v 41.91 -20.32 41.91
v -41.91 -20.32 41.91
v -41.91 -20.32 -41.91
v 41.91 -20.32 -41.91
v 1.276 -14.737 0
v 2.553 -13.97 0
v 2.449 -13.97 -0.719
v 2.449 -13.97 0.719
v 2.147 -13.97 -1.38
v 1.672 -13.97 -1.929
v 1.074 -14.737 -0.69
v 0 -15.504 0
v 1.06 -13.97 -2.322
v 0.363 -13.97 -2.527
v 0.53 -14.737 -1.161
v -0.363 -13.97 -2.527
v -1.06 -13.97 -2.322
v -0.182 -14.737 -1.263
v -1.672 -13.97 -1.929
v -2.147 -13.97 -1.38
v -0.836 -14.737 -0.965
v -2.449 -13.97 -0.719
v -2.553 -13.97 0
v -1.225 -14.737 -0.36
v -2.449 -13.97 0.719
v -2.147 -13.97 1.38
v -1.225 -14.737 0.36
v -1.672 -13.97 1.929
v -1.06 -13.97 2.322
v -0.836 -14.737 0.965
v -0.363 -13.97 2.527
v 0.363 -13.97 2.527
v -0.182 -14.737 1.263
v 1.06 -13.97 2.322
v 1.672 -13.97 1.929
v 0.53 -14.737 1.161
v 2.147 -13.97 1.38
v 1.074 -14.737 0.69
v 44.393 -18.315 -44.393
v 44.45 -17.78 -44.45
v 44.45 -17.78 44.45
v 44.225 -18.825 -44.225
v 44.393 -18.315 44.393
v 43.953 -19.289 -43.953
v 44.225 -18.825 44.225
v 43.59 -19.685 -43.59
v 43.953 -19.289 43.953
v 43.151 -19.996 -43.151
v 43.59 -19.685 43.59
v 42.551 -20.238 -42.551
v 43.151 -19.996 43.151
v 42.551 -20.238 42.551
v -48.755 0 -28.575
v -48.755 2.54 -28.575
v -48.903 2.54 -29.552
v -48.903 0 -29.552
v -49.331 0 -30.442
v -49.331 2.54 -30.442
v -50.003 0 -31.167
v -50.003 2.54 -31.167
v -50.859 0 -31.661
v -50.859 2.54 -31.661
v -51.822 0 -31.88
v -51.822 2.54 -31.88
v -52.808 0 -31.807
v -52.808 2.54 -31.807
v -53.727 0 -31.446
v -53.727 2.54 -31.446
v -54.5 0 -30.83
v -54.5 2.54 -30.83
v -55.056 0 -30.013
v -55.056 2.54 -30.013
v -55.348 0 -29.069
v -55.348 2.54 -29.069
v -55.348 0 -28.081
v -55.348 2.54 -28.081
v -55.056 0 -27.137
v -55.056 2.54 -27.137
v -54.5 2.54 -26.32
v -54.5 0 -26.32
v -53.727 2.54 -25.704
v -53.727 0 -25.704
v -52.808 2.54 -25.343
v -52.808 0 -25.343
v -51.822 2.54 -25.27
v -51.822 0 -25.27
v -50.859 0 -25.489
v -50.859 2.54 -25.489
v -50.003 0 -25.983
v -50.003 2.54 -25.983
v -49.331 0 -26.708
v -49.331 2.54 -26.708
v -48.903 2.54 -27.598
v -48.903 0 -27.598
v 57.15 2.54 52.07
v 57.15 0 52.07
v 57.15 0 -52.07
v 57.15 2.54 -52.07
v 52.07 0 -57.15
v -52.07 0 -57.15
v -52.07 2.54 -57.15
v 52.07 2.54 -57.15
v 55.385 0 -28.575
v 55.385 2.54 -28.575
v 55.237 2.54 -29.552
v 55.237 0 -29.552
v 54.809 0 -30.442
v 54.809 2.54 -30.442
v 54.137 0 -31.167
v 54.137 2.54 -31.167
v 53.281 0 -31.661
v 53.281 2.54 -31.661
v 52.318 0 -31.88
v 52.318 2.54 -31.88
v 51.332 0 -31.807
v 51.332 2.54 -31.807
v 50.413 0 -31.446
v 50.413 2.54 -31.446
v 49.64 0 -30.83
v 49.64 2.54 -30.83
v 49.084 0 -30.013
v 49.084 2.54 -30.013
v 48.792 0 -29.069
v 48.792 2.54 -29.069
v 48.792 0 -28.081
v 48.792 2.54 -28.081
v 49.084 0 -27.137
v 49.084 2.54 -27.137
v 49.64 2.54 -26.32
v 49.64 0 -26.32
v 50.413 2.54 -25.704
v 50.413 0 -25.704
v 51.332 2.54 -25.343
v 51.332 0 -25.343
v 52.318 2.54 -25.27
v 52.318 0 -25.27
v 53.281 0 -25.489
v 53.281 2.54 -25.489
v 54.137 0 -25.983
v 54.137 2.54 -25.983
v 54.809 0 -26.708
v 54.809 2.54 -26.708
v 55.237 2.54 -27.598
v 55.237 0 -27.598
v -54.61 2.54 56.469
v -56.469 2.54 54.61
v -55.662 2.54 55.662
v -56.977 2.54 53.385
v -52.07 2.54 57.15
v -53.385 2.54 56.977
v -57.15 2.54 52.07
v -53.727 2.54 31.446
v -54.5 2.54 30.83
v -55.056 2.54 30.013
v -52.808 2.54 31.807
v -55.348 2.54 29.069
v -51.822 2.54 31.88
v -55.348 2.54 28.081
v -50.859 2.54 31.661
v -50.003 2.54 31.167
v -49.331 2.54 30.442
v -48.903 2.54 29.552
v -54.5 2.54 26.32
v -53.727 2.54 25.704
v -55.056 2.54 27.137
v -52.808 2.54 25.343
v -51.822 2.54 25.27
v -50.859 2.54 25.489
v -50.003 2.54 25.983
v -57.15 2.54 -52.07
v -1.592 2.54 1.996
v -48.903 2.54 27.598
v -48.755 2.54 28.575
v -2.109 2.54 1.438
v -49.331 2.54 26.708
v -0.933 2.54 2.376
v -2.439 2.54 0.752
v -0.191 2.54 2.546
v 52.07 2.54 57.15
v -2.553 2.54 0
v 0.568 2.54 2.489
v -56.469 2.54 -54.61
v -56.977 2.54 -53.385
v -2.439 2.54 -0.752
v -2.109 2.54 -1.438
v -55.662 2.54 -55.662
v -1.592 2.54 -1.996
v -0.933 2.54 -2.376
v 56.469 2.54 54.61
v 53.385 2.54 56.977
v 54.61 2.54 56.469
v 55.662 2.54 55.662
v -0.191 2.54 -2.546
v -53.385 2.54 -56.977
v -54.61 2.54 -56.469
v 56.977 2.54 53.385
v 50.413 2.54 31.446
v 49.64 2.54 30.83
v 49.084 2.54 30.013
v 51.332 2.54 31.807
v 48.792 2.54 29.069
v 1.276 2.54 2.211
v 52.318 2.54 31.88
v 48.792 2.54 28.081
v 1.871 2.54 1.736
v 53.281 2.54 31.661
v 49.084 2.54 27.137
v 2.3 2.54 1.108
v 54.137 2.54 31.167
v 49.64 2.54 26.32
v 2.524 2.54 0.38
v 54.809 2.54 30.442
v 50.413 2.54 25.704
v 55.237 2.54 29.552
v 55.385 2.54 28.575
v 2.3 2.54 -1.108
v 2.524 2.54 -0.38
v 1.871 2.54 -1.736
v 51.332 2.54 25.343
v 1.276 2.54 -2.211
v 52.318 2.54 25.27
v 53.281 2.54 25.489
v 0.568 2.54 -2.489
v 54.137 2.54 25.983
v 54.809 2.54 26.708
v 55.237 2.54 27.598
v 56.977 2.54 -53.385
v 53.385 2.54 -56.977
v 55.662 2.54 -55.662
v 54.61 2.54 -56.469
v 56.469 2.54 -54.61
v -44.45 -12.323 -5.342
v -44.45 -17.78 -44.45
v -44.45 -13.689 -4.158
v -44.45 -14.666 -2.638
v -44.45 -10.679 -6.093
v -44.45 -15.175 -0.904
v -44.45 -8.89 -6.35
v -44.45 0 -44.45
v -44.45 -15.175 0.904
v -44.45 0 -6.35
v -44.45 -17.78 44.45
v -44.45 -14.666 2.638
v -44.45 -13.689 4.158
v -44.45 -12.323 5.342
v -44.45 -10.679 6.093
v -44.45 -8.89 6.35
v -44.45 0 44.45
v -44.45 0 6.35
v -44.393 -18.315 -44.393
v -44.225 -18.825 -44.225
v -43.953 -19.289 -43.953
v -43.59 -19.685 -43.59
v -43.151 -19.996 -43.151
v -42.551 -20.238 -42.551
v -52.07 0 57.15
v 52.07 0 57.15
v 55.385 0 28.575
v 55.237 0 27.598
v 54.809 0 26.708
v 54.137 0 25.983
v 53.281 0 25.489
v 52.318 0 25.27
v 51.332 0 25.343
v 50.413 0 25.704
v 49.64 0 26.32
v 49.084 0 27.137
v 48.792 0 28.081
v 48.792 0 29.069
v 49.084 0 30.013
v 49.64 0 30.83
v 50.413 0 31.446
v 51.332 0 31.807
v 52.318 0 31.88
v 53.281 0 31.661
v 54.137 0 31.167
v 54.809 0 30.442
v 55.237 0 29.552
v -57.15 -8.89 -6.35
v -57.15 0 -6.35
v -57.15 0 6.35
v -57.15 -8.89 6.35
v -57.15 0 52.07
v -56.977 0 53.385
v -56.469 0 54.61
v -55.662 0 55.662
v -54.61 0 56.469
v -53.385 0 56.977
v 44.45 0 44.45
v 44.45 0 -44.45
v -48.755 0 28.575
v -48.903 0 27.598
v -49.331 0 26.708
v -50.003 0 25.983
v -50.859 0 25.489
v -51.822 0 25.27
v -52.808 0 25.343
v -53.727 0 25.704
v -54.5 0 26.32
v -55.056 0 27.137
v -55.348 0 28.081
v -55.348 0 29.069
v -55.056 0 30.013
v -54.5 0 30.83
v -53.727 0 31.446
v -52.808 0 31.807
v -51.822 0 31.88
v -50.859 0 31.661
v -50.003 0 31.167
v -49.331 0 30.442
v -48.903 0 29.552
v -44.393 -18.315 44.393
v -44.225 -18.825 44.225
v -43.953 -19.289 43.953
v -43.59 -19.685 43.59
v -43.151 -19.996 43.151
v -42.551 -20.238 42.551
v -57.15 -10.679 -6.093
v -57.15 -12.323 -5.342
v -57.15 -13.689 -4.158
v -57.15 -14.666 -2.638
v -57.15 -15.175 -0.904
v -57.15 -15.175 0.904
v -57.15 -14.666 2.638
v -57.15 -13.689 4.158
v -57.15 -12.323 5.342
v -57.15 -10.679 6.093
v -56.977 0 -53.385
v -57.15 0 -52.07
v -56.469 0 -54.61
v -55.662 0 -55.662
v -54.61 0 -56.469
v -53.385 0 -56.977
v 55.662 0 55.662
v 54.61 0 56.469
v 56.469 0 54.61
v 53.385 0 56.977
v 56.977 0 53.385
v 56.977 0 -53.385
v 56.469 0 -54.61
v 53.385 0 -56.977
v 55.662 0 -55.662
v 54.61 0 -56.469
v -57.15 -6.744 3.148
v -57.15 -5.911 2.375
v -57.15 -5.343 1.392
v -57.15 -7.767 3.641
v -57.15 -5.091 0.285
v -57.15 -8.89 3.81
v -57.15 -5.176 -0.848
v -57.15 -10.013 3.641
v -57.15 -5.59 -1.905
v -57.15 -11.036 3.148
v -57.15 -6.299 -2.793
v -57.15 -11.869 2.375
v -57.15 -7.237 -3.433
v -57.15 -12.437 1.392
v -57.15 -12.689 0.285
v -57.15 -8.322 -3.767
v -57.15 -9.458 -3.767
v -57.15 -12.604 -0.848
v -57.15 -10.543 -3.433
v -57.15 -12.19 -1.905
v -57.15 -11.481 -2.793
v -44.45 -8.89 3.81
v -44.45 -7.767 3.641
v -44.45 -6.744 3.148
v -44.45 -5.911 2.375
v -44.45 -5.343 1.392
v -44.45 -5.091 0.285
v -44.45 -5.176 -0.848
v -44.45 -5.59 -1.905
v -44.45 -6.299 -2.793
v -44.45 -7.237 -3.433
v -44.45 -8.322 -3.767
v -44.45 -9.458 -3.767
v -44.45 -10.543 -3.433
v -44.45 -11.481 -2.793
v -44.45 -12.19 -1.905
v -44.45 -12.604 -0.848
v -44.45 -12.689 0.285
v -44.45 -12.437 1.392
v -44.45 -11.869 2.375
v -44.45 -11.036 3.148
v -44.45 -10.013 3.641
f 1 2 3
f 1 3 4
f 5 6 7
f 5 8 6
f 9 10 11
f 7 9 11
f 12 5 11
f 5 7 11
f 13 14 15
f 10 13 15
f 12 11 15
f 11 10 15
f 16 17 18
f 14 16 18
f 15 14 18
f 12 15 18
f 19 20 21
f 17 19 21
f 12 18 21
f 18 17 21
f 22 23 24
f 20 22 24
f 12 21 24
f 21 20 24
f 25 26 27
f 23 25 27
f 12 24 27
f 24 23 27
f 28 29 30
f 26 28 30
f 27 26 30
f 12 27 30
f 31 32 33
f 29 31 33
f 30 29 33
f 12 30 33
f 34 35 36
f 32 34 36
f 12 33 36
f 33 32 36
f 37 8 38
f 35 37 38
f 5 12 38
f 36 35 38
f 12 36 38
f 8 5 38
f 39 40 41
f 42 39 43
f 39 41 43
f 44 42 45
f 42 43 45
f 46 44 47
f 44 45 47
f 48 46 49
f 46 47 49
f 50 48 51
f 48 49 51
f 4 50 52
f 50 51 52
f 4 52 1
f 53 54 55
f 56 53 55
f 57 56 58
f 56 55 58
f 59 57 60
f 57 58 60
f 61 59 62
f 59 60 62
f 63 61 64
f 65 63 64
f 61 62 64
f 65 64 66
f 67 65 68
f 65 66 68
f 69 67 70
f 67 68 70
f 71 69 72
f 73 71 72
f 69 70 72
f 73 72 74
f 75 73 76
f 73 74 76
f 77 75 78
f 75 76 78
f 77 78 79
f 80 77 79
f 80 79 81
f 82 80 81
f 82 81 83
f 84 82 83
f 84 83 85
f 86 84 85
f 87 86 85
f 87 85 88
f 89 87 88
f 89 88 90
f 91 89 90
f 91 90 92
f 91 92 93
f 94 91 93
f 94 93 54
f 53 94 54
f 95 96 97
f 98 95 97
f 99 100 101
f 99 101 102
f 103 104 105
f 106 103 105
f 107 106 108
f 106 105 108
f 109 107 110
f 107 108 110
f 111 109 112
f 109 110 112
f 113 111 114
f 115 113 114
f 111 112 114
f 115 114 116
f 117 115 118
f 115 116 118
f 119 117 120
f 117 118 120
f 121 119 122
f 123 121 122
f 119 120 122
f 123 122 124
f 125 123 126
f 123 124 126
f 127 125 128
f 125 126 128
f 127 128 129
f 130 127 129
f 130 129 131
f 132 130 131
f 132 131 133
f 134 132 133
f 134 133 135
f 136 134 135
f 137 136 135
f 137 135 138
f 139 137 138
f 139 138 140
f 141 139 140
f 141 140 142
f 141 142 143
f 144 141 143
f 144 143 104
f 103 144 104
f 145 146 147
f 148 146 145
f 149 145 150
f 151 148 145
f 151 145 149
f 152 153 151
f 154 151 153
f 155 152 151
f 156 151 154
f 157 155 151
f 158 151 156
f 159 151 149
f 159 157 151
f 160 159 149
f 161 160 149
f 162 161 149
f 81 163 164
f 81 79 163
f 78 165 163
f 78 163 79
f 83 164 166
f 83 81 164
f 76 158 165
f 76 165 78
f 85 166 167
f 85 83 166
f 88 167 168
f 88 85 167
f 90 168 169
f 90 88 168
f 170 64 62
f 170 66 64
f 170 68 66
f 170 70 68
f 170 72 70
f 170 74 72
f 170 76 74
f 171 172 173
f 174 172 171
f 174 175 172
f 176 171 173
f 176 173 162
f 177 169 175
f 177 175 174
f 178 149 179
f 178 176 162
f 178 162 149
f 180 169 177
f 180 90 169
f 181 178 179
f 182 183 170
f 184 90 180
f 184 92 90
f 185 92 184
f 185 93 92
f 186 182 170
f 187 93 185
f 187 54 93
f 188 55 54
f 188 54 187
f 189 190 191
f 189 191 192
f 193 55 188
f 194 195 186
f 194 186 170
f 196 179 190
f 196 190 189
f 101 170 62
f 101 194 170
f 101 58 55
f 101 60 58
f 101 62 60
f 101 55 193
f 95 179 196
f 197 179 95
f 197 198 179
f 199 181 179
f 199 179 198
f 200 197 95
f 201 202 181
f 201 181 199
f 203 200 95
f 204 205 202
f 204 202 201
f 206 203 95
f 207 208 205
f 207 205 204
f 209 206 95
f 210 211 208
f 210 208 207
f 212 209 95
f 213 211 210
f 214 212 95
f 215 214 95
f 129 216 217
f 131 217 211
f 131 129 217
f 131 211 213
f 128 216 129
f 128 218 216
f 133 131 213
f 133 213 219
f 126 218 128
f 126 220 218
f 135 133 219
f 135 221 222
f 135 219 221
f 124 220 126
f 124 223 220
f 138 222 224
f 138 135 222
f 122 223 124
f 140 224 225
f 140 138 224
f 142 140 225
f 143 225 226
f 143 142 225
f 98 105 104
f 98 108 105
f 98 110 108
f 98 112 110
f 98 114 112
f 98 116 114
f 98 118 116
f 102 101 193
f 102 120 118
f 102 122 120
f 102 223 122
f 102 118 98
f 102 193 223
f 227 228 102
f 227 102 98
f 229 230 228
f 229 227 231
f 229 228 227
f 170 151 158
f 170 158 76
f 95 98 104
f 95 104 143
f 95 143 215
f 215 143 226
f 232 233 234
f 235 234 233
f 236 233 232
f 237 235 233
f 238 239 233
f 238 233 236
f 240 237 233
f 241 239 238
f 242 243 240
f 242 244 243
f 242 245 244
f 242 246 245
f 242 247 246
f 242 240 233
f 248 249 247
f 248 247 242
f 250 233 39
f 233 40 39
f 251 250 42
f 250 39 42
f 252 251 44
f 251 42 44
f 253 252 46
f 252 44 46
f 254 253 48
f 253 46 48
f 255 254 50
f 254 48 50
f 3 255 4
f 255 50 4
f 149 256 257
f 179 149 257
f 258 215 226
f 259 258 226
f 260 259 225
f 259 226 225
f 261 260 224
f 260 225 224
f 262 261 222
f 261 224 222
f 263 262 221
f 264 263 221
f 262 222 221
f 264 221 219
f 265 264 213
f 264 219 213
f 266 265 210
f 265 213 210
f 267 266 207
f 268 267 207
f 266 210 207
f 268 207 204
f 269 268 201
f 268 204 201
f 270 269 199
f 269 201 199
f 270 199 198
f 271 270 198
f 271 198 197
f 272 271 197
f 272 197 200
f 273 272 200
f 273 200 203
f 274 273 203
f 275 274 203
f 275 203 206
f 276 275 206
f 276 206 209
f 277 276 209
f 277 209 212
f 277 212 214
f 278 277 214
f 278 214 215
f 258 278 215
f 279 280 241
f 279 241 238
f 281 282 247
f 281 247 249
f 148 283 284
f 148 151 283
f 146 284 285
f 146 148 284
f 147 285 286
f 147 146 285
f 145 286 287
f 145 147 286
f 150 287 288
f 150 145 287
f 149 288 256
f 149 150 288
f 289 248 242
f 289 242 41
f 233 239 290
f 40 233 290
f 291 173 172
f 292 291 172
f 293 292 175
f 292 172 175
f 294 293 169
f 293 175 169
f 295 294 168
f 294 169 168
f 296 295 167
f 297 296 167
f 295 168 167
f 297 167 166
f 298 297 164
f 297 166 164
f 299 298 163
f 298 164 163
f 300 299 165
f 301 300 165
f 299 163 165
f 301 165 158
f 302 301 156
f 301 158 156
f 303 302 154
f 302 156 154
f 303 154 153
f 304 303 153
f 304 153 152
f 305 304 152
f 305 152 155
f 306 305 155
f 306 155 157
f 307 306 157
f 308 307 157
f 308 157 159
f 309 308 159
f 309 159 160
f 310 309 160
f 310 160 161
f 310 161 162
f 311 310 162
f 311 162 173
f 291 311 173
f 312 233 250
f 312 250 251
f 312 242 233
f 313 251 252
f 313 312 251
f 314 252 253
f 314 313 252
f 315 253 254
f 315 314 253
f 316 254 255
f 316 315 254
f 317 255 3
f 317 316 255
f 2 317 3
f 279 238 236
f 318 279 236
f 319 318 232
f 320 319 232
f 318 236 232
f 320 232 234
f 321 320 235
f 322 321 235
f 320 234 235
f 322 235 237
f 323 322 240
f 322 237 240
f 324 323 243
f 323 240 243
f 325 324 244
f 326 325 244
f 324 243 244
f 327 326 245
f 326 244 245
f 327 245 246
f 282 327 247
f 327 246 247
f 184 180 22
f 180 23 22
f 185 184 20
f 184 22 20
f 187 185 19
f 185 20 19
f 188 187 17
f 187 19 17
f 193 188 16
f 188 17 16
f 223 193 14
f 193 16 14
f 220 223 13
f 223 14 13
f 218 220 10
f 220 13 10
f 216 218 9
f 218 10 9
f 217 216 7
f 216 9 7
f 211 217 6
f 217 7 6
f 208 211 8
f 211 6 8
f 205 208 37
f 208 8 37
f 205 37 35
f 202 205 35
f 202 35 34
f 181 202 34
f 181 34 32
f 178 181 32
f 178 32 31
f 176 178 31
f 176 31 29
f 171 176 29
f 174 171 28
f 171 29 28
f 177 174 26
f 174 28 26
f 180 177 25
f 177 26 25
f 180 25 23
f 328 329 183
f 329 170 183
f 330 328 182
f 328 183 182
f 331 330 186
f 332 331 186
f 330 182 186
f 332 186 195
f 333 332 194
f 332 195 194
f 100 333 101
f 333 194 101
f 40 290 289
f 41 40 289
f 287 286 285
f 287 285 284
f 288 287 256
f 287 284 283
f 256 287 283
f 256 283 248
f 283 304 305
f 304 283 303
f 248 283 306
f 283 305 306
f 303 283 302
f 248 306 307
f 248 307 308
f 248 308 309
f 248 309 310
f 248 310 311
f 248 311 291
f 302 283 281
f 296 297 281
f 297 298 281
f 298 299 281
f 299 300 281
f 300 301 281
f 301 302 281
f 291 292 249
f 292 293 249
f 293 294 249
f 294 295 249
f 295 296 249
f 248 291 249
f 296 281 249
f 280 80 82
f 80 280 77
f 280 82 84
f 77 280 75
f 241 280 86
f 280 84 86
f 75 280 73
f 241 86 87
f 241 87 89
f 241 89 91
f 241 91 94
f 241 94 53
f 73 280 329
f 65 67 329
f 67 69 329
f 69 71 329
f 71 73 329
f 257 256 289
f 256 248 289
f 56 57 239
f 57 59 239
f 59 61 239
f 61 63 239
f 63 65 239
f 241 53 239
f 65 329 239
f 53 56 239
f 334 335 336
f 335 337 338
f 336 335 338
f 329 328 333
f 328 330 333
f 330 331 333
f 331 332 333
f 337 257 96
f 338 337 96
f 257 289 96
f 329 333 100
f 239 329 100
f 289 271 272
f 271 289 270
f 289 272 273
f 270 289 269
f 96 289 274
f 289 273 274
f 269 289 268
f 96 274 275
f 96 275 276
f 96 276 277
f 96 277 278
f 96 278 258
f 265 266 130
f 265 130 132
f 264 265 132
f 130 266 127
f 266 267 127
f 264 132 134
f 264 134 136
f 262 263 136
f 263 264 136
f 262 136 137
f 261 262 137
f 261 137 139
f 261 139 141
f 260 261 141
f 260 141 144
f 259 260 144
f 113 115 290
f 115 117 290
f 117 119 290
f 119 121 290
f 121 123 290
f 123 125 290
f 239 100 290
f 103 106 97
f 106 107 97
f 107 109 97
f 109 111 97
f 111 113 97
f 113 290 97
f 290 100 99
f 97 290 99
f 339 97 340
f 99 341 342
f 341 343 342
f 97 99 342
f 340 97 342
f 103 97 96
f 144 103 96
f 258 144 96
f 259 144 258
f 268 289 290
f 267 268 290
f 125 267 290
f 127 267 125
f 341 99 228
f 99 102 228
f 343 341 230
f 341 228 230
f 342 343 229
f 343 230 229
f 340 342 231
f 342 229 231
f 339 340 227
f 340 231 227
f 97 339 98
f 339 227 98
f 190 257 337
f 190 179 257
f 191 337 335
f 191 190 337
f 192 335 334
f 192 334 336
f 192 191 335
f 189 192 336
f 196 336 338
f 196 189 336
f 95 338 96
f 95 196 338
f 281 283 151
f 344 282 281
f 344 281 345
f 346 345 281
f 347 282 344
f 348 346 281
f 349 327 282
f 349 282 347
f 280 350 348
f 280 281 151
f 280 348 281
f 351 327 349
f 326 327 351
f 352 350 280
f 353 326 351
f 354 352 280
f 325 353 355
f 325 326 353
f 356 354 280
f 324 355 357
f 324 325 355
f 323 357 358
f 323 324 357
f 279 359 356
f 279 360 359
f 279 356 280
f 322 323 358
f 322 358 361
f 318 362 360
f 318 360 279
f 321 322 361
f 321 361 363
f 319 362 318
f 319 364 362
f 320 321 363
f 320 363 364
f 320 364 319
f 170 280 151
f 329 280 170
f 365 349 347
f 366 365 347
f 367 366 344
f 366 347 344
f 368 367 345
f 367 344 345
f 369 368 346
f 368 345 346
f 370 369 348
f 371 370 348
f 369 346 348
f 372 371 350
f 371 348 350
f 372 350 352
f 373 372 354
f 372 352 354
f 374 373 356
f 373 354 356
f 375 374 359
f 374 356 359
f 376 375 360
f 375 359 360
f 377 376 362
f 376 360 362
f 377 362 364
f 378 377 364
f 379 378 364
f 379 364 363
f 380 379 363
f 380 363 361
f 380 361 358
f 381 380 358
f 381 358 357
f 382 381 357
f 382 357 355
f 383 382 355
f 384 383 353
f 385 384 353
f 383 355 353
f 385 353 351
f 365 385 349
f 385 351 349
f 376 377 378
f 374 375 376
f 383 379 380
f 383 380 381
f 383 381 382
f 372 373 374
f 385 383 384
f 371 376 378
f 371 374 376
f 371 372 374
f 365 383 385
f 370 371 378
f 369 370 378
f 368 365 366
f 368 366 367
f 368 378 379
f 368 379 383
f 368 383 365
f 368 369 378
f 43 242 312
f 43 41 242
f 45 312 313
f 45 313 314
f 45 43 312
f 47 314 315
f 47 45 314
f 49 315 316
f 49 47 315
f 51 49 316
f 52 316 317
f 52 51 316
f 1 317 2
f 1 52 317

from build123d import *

# Parameters (mm, degrees)
SKETCH1_W                   = 114.3
SKETCH1_H                   = 114.3
BOSS_EXTRUDE1_DEPTH         = 2.54
SKETCH2_W                   = 88.9
SKETCH2_H                   = 88.9
BOSS_EXTRUDE2_DEPTH         = 20.32
G_0_261_DIAMETER_HOLE1_D    = 6.6294
FILLET1_R                   = 2.54
FILLET2_R                   = 5.08
BOSS_EXTRUDE3_DEPTH         = 12.7
SKETCH8_R                   = 3.81
CUT_EXTRUDE1_DEPTH          = 12.7
F_1_4_20_TAPPED_HOLE1_D     = 5.1054
F_1_4_20_TAPPED_HOLE1_DEPTH = 16.51
F_1_4_20_TAPPED_HOLE1_TIP   = 1.533816902


with BuildPart() as part:
    # Sketch1 → Boss-Extrude1 (new body)
    with BuildSketch(Plane(origin=(0, 0, 0), x_dir=(1, 0, 0), z_dir=(0, 1, 0))):
        Rectangle(SKETCH1_W, SKETCH1_H)
    extrude(amount=BOSS_EXTRUDE1_DEPTH)

    # Sketch2 → Boss-Extrude2 (add)
    with BuildSketch(Plane.XZ):
        Rectangle(SKETCH2_W, SKETCH2_H)
    extrude(amount=BOSS_EXTRUDE2_DEPTH)

    # G (0.261) Diameter Hole1 (through all)
    with Locations(Plane(origin=(0, 0, 0), x_dir=(-1, 0, 0), z_dir=(0, -1, 0))):
        with Locations((52.07, -28.575), (52.07, 28.575), (-52.07, -28.575), (-52.07, 28.575)):
            Hole(G_0_261_DIAMETER_HOLE1_D / 2)

    # Fillet1
    fillet1_edges = [part.edges().sort_by_distance(p)[0] for p in [
        (44.45, -20.32, 0),
        (0, -20.32, 44.45),
        (-44.45, -20.32, 0),
        (0, -20.32, -44.45),
    ]]
    fillet(fillet1_edges, radius=FILLET1_R)

    # Fillet2
    fillet2_edges = [part.edges().sort_by_distance(p)[0] for p in [
        (-57.15, 1.27, -57.15),
        (57.15, 1.27, -57.15),
        (57.15, 1.27, 57.15),
        (-57.15, 1.27, 57.15),
    ]]
    fillet(fillet2_edges, radius=FILLET2_R)

    # Sketch5 → Boss-Extrude3 (add)
    with BuildSketch(Plane.ZY.offset(44.45)):
        with BuildLine():
            ThreePointArc((-6.35, -8.89), (0, -15.24), (6.35, -8.89))
            Line((6.35, -8.89), (-6.35, -8.89))
        make_face()
        with BuildLine():
            Line((-6.35, -8.89), (6.35, -8.89))
            ThreePointArc((6.35, -8.89), (0, -2.54), (-6.35, -8.89))
        make_face()
        with BuildLine():
            ThreePointArc((-6.35, -8.89), (0, -2.54), (6.35, -8.89))
            Line((6.35, -8.89), (6.35, 0))
            Line((6.35, 0), (-6.35, 0))
            Line((-6.35, 0), (-6.35, -8.89))
        make_face()
    extrude(amount=BOSS_EXTRUDE3_DEPTH)

    # Sketch8 → Cut-Extrude1 (cut)
    with BuildSketch(Plane.ZY.offset(57.15)):
        with Locations((0, -8.89)):
            Circle(SKETCH8_R)
    extrude(amount=-CUT_EXTRUDE1_DEPTH, mode=Mode.SUBTRACT)

    # 1/4-20 Tapped Hole1
    with Locations(Plane(origin=(0, 2.54, 0), x_dir=(1, 0, 0), z_dir=(0, 1, 0))):
        with Locations((0, 0)):
            Hole(F_1_4_20_TAPPED_HOLE1_D / 2, depth=F_1_4_20_TAPPED_HOLE1_DEPTH)
            with Locations((0, 0, -(F_1_4_20_TAPPED_HOLE1_DEPTH + F_1_4_20_TAPPED_HOLE1_TIP / 2))):  # 118° drill point
                Cone(0, F_1_4_20_TAPPED_HOLE1_D / 2, F_1_4_20_TAPPED_HOLE1_TIP, mode=Mode.SUBTRACT)


solid = part.part
